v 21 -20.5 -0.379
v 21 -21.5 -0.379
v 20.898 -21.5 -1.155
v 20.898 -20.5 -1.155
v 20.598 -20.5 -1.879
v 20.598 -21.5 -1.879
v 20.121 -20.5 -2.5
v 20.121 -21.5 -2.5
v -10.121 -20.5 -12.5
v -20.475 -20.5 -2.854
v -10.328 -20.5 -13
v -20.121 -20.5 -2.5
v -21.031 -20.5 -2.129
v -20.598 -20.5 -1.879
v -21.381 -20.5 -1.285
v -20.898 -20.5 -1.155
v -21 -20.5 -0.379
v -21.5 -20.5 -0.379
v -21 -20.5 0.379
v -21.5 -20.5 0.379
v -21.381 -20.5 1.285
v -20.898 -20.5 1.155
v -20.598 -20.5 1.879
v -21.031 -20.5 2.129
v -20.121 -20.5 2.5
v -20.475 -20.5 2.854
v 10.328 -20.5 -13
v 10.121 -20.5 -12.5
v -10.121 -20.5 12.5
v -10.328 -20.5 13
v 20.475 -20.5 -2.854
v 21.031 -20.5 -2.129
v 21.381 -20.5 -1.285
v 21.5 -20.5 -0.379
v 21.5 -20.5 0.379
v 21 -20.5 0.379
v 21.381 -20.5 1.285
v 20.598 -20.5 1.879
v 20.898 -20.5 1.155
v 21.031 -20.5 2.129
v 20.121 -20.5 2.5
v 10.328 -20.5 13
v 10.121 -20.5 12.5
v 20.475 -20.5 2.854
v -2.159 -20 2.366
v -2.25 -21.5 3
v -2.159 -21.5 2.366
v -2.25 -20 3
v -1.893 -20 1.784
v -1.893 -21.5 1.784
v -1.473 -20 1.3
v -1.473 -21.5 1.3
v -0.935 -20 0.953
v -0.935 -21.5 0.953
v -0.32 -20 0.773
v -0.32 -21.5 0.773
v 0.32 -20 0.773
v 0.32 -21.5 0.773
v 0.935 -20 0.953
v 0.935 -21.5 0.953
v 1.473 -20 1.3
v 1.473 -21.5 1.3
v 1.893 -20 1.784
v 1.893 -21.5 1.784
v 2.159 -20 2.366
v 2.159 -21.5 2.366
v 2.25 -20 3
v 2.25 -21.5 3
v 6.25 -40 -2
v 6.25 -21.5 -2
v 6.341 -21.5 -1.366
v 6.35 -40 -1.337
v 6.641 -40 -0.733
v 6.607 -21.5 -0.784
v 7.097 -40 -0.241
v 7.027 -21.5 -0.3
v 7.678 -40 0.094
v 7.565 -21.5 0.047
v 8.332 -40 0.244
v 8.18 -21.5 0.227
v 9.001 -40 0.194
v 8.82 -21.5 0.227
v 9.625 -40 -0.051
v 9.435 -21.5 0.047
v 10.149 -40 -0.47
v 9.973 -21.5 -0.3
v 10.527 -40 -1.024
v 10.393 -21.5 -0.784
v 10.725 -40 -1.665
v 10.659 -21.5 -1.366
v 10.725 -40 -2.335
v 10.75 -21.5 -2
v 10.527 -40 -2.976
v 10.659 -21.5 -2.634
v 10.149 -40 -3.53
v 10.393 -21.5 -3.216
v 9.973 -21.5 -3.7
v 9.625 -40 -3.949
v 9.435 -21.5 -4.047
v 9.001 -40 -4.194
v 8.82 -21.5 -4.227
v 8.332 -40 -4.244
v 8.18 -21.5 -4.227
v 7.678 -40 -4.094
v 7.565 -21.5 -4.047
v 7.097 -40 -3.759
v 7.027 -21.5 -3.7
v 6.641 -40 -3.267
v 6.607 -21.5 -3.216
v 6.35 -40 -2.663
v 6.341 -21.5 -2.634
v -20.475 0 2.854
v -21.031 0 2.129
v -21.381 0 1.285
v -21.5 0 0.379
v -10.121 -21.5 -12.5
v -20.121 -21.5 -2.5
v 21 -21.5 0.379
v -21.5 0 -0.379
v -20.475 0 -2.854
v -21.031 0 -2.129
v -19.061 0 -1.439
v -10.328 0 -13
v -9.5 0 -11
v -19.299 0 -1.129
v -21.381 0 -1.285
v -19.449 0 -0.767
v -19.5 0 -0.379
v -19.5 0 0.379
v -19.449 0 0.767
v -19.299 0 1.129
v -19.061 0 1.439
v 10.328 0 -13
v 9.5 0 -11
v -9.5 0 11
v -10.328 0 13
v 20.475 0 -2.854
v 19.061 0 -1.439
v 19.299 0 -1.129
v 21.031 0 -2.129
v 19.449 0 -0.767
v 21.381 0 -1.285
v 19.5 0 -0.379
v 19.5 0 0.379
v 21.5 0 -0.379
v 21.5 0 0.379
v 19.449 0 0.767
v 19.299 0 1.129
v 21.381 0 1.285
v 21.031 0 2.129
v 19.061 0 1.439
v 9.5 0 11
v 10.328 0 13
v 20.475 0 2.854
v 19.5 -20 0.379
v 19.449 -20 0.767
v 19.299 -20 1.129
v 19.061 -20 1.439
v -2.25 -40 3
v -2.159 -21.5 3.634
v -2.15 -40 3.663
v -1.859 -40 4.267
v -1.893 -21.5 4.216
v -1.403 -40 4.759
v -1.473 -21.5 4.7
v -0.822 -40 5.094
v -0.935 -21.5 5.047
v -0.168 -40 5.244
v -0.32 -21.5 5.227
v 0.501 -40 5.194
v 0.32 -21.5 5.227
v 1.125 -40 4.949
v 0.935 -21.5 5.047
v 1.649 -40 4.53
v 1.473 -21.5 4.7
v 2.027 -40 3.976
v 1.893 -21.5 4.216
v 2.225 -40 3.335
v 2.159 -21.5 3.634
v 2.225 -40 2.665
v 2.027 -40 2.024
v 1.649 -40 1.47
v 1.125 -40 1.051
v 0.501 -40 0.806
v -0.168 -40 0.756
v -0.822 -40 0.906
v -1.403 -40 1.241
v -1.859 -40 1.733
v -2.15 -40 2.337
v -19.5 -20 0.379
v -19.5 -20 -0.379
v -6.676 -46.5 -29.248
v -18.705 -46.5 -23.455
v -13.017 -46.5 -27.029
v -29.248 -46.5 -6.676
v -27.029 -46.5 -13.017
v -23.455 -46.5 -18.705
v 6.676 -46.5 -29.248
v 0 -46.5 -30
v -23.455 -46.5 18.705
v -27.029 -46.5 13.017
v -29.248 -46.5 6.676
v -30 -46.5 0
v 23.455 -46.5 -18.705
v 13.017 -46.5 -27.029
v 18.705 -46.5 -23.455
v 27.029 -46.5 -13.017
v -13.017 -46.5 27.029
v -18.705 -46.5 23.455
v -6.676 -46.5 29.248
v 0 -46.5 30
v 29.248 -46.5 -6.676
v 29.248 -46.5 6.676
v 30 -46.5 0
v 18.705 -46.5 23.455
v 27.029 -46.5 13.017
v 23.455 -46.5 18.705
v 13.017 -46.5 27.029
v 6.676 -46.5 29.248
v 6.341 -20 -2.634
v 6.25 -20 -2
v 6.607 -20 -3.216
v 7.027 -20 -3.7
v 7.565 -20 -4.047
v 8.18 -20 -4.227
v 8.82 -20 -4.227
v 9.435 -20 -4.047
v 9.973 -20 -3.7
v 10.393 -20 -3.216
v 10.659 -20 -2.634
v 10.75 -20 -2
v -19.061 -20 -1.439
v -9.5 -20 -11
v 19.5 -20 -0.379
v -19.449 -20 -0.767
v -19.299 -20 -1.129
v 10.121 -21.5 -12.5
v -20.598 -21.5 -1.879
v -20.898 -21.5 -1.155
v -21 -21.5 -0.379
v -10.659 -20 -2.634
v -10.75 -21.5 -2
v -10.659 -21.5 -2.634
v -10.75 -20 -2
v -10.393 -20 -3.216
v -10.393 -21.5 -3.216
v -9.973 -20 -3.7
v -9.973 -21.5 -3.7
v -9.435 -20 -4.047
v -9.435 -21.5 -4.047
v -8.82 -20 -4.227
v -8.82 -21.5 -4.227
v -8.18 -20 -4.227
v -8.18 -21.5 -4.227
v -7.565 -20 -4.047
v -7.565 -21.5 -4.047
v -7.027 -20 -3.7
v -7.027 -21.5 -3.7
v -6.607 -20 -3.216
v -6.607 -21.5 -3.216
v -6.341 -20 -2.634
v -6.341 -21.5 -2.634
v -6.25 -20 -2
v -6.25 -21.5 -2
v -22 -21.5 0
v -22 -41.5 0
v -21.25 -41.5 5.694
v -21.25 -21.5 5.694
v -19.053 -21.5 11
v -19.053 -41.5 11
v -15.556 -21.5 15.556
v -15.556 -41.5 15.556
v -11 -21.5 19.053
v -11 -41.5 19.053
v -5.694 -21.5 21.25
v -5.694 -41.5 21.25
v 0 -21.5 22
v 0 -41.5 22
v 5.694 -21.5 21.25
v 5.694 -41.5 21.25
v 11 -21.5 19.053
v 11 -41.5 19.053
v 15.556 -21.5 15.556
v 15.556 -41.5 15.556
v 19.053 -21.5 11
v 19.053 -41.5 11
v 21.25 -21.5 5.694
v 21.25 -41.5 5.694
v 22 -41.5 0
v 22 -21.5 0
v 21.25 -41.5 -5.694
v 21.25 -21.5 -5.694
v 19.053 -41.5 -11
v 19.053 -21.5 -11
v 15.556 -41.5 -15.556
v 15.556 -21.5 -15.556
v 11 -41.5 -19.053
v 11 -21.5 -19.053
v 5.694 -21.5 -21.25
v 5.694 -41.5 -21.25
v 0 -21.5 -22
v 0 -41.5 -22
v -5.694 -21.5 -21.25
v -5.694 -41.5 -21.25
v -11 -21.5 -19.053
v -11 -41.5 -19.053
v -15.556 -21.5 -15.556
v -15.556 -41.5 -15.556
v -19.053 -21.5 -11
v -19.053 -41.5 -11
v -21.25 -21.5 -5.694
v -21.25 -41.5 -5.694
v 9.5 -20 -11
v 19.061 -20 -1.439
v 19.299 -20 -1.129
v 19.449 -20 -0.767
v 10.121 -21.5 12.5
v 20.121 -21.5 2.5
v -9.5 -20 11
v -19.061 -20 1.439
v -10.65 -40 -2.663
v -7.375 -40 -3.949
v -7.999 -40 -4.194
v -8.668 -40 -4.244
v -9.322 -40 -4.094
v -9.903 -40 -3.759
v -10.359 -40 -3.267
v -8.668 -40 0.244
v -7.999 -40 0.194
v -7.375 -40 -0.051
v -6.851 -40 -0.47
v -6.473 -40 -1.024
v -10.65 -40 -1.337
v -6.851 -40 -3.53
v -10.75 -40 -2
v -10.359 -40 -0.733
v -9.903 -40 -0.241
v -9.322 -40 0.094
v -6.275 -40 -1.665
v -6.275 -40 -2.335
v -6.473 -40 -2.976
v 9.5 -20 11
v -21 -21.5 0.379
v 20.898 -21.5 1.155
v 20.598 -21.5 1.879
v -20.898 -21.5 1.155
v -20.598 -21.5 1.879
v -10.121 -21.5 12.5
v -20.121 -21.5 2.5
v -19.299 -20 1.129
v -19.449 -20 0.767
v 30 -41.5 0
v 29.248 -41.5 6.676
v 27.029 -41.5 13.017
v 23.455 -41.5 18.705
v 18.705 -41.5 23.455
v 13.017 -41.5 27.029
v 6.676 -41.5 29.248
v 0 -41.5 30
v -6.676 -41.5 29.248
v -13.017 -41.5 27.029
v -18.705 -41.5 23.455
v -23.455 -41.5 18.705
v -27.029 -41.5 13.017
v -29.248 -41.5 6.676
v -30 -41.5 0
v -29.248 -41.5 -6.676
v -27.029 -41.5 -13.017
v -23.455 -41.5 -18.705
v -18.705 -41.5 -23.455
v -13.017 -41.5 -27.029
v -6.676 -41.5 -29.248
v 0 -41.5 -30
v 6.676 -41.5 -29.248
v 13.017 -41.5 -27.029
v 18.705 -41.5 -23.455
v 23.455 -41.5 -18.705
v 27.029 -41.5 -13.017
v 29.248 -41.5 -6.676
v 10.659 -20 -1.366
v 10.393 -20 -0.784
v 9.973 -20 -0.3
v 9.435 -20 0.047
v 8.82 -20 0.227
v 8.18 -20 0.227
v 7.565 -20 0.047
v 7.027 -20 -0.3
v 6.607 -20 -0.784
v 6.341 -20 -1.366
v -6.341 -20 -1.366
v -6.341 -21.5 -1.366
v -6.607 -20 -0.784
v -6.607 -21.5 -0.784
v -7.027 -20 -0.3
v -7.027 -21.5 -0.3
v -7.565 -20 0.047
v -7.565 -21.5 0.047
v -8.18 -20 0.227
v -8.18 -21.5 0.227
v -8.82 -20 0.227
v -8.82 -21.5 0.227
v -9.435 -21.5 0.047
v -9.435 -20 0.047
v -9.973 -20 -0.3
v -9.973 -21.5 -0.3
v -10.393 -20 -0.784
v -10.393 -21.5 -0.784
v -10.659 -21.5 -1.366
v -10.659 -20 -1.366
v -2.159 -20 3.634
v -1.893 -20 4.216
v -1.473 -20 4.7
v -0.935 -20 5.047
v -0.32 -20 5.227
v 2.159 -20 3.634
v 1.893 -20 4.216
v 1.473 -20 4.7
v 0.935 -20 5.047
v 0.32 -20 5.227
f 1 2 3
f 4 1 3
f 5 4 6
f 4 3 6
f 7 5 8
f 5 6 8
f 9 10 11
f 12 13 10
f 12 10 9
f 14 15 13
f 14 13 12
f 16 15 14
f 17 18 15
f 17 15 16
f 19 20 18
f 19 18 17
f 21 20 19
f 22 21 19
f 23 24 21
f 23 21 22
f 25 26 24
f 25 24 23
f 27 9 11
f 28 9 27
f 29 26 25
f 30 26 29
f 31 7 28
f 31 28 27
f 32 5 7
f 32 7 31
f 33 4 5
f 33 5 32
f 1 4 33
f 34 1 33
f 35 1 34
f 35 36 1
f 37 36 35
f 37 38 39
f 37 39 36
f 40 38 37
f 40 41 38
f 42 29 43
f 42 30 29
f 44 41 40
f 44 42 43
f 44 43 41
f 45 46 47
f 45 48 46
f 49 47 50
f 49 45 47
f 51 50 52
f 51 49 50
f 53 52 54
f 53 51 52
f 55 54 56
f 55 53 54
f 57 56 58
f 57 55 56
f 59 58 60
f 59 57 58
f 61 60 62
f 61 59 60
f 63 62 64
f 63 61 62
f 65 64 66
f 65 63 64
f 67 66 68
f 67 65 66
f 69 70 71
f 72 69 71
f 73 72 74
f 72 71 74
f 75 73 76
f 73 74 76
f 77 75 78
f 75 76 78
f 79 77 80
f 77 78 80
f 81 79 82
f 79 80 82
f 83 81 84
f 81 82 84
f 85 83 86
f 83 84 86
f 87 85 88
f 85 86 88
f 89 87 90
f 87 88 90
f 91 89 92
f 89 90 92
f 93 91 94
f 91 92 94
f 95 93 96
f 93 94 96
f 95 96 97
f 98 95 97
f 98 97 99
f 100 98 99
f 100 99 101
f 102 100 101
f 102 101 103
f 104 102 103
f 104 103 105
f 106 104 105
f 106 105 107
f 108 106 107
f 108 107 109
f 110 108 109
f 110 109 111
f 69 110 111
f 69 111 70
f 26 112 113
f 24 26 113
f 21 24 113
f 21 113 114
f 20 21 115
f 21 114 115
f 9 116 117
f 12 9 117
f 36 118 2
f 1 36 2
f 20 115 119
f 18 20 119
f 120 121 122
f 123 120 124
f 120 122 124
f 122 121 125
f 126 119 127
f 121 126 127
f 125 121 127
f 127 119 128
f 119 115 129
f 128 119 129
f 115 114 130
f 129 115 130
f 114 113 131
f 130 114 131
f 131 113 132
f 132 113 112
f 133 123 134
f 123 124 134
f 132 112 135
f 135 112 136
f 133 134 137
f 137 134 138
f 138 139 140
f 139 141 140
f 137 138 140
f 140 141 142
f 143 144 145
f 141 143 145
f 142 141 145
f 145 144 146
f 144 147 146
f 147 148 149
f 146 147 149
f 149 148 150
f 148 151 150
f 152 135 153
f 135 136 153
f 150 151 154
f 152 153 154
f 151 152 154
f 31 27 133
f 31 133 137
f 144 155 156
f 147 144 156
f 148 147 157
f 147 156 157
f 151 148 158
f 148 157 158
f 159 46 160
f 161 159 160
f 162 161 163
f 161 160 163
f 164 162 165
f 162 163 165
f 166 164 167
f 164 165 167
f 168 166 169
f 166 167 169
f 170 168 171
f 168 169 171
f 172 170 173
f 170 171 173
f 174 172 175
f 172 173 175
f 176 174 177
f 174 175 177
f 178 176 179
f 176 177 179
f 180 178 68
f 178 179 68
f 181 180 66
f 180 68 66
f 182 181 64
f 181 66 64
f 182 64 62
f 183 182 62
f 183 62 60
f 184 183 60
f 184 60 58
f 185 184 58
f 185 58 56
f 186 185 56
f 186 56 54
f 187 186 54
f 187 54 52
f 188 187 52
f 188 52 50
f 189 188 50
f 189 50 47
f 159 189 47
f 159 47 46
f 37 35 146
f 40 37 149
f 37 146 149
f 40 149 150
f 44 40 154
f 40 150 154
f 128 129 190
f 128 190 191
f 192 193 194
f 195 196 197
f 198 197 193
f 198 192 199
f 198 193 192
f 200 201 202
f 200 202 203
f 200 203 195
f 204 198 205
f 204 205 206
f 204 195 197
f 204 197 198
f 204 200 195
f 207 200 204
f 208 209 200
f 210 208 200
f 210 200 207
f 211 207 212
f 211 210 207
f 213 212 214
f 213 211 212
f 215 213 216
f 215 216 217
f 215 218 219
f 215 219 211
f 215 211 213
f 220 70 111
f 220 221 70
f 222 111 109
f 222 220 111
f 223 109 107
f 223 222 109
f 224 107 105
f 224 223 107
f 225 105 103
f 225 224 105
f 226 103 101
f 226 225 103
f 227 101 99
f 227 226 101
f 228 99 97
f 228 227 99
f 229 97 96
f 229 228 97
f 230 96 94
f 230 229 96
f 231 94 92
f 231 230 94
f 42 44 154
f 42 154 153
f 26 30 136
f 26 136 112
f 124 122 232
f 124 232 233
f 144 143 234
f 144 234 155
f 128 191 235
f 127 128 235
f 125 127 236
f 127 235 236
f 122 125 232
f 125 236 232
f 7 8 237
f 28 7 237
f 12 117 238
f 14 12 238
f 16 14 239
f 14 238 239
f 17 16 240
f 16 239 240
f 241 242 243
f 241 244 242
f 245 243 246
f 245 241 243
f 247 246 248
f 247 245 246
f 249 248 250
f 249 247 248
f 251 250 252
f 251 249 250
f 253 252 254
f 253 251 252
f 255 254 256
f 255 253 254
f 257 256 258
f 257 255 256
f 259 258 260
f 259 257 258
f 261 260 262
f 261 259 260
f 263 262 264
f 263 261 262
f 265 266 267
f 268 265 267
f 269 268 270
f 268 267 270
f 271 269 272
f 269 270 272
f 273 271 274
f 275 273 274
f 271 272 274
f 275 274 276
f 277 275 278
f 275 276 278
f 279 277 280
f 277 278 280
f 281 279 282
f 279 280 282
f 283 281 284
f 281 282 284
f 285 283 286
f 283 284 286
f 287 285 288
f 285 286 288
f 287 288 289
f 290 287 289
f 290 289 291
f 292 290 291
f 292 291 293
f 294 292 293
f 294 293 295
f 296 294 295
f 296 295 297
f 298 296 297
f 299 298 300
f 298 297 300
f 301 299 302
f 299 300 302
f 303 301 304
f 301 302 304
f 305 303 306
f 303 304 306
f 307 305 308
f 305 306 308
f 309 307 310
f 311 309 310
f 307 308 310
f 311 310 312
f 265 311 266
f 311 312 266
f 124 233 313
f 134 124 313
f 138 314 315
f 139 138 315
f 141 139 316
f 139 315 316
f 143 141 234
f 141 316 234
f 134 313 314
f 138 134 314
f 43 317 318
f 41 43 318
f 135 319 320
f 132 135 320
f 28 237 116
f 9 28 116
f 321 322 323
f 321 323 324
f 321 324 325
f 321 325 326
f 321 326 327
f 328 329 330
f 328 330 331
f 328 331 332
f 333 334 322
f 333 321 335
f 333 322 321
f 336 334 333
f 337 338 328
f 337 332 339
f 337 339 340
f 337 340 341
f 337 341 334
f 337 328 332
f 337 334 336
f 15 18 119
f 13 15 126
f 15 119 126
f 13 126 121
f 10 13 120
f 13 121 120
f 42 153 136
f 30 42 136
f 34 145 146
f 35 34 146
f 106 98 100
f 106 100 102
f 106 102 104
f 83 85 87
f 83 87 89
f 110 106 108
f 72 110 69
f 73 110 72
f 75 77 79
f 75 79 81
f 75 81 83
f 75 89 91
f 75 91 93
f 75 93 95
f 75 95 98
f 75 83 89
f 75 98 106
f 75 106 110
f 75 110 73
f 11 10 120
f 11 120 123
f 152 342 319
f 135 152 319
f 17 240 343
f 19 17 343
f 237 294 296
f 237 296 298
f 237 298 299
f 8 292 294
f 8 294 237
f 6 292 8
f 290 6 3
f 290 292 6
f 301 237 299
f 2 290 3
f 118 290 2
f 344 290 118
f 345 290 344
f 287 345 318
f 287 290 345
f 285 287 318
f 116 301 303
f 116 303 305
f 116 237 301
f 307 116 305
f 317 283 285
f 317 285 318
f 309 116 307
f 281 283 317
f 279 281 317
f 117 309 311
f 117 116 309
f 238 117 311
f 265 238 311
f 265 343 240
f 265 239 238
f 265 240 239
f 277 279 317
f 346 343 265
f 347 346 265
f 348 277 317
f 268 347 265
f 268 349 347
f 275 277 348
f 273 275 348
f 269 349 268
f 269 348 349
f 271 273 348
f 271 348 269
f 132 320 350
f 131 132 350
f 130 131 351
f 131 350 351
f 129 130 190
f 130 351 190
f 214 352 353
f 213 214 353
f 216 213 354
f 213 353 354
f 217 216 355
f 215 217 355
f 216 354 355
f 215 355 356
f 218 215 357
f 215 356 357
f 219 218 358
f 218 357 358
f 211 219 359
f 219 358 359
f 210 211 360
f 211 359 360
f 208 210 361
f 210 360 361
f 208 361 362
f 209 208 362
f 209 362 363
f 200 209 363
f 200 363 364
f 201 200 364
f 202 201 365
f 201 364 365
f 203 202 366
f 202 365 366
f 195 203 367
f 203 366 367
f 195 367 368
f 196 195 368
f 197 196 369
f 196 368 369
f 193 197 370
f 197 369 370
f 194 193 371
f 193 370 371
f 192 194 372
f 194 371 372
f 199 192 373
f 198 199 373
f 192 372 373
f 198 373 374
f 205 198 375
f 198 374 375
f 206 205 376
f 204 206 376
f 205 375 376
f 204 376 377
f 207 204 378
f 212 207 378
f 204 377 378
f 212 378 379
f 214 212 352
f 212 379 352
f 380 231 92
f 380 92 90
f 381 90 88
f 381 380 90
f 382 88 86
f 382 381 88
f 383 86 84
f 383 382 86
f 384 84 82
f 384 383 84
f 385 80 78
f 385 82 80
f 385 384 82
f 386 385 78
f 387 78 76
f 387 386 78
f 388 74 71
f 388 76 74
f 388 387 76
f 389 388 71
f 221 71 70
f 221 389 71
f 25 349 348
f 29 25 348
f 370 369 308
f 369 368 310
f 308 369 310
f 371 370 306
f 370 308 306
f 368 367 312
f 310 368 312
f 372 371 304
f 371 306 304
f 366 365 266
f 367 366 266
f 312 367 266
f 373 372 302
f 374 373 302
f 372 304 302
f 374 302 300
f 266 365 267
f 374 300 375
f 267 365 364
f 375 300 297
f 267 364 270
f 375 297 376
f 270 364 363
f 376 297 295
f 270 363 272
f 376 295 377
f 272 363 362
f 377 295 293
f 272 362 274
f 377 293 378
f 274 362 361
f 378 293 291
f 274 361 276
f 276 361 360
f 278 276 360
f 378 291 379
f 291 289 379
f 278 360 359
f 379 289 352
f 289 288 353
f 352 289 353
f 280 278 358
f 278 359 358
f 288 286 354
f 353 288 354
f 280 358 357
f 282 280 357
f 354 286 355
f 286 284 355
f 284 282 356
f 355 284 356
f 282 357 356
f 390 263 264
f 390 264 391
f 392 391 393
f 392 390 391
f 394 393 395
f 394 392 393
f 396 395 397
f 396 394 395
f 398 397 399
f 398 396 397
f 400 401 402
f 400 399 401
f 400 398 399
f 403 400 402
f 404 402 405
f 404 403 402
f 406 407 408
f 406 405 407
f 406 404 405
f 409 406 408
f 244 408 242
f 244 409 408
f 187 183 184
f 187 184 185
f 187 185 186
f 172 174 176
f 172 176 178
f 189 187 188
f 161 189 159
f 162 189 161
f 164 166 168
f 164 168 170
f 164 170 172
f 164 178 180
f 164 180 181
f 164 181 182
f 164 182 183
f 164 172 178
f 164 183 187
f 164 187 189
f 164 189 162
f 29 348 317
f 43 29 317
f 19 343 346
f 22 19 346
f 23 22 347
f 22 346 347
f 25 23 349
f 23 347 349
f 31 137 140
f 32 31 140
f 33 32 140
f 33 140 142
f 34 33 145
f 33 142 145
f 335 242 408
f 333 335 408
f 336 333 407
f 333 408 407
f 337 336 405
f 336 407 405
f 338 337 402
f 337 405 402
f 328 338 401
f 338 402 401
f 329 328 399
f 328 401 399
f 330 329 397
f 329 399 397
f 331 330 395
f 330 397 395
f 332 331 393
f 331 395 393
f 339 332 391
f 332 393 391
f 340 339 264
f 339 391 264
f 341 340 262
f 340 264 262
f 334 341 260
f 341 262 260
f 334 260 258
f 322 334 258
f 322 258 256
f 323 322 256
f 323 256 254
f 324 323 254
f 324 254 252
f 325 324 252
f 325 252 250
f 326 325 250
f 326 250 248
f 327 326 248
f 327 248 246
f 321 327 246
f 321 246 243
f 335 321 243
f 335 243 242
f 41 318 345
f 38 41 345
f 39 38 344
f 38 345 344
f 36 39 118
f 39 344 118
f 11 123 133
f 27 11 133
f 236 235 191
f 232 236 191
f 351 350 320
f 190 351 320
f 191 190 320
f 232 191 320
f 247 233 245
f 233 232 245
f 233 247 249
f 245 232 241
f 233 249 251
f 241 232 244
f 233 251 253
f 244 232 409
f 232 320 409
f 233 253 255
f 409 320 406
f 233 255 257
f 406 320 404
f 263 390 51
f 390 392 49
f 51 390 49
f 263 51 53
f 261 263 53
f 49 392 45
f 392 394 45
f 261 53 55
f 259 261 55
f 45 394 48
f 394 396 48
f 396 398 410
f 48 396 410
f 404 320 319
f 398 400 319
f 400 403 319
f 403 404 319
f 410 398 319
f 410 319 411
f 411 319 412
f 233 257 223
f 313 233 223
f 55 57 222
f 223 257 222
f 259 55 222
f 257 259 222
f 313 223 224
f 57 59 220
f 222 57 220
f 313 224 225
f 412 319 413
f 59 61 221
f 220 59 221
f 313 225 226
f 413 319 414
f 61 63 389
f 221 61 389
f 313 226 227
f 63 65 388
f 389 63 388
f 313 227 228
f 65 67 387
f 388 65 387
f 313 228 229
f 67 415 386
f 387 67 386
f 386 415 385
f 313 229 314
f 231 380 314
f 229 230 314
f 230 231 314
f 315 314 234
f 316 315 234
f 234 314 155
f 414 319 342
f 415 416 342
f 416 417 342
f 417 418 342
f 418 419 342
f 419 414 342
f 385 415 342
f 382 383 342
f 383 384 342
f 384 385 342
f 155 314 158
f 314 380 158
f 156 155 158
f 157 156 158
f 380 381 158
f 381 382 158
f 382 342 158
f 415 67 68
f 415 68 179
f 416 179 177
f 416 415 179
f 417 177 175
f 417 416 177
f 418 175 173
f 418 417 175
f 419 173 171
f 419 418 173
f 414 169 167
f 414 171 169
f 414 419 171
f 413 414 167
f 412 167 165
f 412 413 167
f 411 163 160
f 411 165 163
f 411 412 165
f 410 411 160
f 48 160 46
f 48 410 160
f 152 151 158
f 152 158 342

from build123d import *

# Parameters (mm, degrees)
F0_W      = 39
F0_H      = 22
F1_DEPTH  = 20
F2_SIZE   = 10
F3_R      = 1.5
F5_DEPTH  = 20
F6_T      = -2
F7_R      = 2.25
F8_DEPTH  = 1.5
F10_R     = 2.25
F11_DEPTH = 20
F13_DEPTH = 1
F14_R     = 30
F15_DEPTH = 5
F16_R     = 22
F17_DEPTH = 20
F18_R     = 2.25
F19_DEPTH = 20


with BuildPart() as f1:
    # F0 (on Front) → F1 (new body)
    with BuildSketch(Plane.XZ):
        Rectangle(F0_W, F0_H)
    extrude(amount=F1_DEPTH)

    # F2
    f2_edges = [f1.edges().sort_by_distance(p)[0] for p in [
        (19.5, -10, 11),
        (-19.5, -10, 11),
        (19.5, -10, -11),
        (-19.5, -10, -11),
    ]]
    chamfer(f2_edges, length=F2_SIZE)

    # F3
    f3_edges = [f1.edges().sort_by_distance(p)[0] for p in [
        (19.5, -10, -1),
        (-19.5, -10, 1),
        (-19.5, -10, -1),
        (19.5, -10, 1),
    ]]
    fillet(f3_edges, radius=F3_R)

    # F4 (on face) → F5 (join, through all)
    with BuildSketch(Plane.XZ.offset(20)):
        with BuildLine():
            ThreePointArc((-20.4748737342, 2.8535533906), (-21.2335783638, 1.7180716697), (-21.5, 0.3786796564))
            Line((-21.5, 0.3786796564), (-21.5, -0.3786796564))
            ThreePointArc((-21.5, -0.3786796564), (-21.2335783638, -1.7180716697), (-20.4748737342, -2.8535533906))
            Line((-20.4748737342, -2.8535533906), (-10.3284271247, -13))
            Line((-10.3284271247, -13), (10.3284271247, -13))
            Line((10.3284271247, -13), (20.4748737342, -2.8535533906))
            ThreePointArc((20.4748737342, -2.8535533906), (21.2335783638, -1.7180716697), (21.5, -0.3786796564))
            Line((21.5, -0.3786796564), (21.5, 0.3786796564))
            ThreePointArc((21.5, 0.3786796564), (21.2335783638, 1.7180716697), (20.4748737342, 2.8535533906))
            Line((20.4748737342, 2.8535533906), (10.3284271247, 13))
            Line((10.3284271247, 13), (-10.3284271247, 13))
            Line((-10.3284271247, 13), (-20.4748737342, 2.8535533906))
        make_face()
    extrude(amount=-F5_DEPTH)

    # F6
    f6_openings = [f1.faces().sort_by_distance(p)[0] for p in [
        (0, -20, 0),
        (0, 0, 0),
    ]]
    offset(amount=F6_T, openings=f6_openings)

    # F7 (on face) → F8 (join)
    with BuildSketch(Plane.XZ.offset(20)):
        with BuildLine():
            Line((10.3284271247, 13), (-10.3284271247, 13))
            Line((-10.3284271247, 13), (-20.4748737342, 2.8535533906))
            ThreePointArc((-20.4748737342, 2.8535533906), (-21.2335783638, 1.7180716697), (-21.5, 0.3786796564))
            Line((-21.5, 0.3786796564), (-21.5, -0.3786796564))
            ThreePointArc((-21.5, -0.3786796564), (-21.2335783638, -1.7180716697), (-20.4748737342, -2.8535533906))
            Line((-20.4748737342, -2.8535533906), (-10.3284271247, -13))
            Line((-10.3284271247, -13), (10.3284271247, -13))
            Line((10.3284271247, -13), (20.4748737342, -2.8535533906))
            ThreePointArc((20.4748737342, -2.8535533906), (21.2335783638, -1.7180716697), (21.5, -0.3786796564))
            Line((21.5, -0.3786796564), (21.5, 0.3786796564))
            ThreePointArc((21.5, 0.3786796564), (21.2335783638, 1.7180716697), (20.4748737342, 2.8535533906))
            Line((20.4748737342, 2.8535533906), (10.3284271247, 13))
        make_face()
        with Locations((-8.5, -2)):
            Circle(F7_R, mode=Mode.SUBTRACT)
        with Locations((8.5, -2)):
            Circle(F7_R, mode=Mode.SUBTRACT)
        with Locations((0, 3)):
            Circle(F7_R, mode=Mode.SUBTRACT)
    extrude(amount=F8_DEPTH)

    # F10 (on face) → F11 (join)
    with BuildSketch(Plane.XZ.offset(21.5)):
        with BuildLine():
            ThreePointArc((-21.5, -0.3786796564), (-21.2335783638, -1.7180716697), (-20.4748737342, -2.8535533906))
            Line((-20.4748737342, -2.8535533906), (-10.3284271247, -13))
            Line((-10.3284271247, -13), (10.3284271247, -13))
            Line((10.3284271247, -13), (20.4748737342, -2.8535533906))
            ThreePointArc((20.4748737342, -2.8535533906), (21.2335783638, -1.7180716697), (21.5, -0.3786796564))
            Line((21.5, -0.3786796564), (21.5, 0.3786796564))
            ThreePointArc((21.5, 0.3786796564), (21.2335783638, 1.7180716697), (20.4748737342, 2.8535533906))
            Line((20.4748737342, 2.8535533906), (10.3284271247, 13))
            Line((10.3284271247, 13), (-10.3284271247, 13))
            Line((-10.3284271247, 13), (-20.4748737342, 2.8535533906))
            ThreePointArc((-20.4748737342, 2.8535533906), (-21.2335783638, 1.7180716697), (-21.5, 0.3786796564))
            Line((-21.5, 0.3786796564), (-21.5, -0.3786796564))
        make_face()
        with Locations((-8.5, -2)):
            Circle(F10_R, mode=Mode.SUBTRACT)
        with Locations((8.5, -2)):
            Circle(F10_R, mode=Mode.SUBTRACT)
        with Locations((0, 3)):
            Circle(F10_R, mode=Mode.SUBTRACT)
    extrude(amount=F11_DEPTH)

    # F12 (on offset) → F13 (cut)
    with BuildSketch(Plane.XZ.offset(21.5)):
        with BuildLine():
            Line((20.4748737342, 2.8535533906), (10.3284271247, 13))
            Line((10.3284271247, 13), (-10.3284271247, 13))
            Line((-10.3284271247, 13), (-20.4748737342, 2.8535533906))
            ThreePointArc((-20.4748737342, 2.8535533906), (-21.2335783638, 1.7180716697), (-21.5, 0.3786796564))
            Line((-21.5, 0.3786796564), (-21.5, -0.3786796564))
            ThreePointArc((-21.5, -0.3786796564), (-21.2335783638, -1.7180716697), (-20.4748737342, -2.8535533906))
            Line((-20.4748737342, -2.8535533906), (-10.3284271247, -13))
            Line((-10.3284271247, -13), (10.3284271247, -13))
            Line((10.3284271247, -13), (20.4748737342, -2.8535533906))
            ThreePointArc((20.4748737342, -2.8535533906), (21.2335783638, -1.7180716697), (21.5, -0.3786796564))
            Line((21.5, -0.3786796564), (21.5, 0.3786796564))
            ThreePointArc((21.5, 0.3786796564), (21.2335783638, 1.7180716697), (20.4748737342, 2.8535533906))
        make_face()
        with BuildLine():
            Line((-10.1213203436, 12.5), (10.1213203436, 12.5))
            Line((10.1213203436, 12.5), (20.1213203436, 2.5))
            ThreePointArc((20.1213203436, 2.5), (20.7716385975, 1.5267299535), (21, 0.3786796564))
            Line((21, 0.3786796564), (21, -0.3786796564))
            ThreePointArc((21, -0.3786796564), (20.7716385975, -1.5267299535), (20.1213203436, -2.5))
            Line((20.1213203436, -2.5), (10.1213203436, -12.5))
            Line((10.1213203436, -12.5), (-10.1213203436, -12.5))
            Line((-10.1213203436, -12.5), (-20.1213203436, -2.5))
            ThreePointArc((-20.1213203436, -2.5), (-20.7716385975, -1.5267299535), (-21, -0.3786796564))
            Line((-21, -0.3786796564), (-21, 0.3786796564))
            ThreePointArc((-21, 0.3786796564), (-20.7716385975, 1.5267299535), (-20.1213203436, 2.5))
            Line((-20.1213203436, 2.5), (-10.1213203436, 12.5))
        make_face(mode=Mode.SUBTRACT)
    extrude(amount=-F13_DEPTH, mode=Mode.SUBTRACT)

    # F14 (on face) → F15 (join)
    with BuildSketch(Plane.XZ.offset(41.5)):
        Circle(F14_R)
    extrude(amount=F15_DEPTH)

    # F16 (on face) → F17 (join, through all)
    with BuildSketch(Plane(origin=(0, -41.5, 0), x_dir=(-1, 0, 0), z_dir=(0, 1, 0))):
        Circle(F16_R)
    extrude(amount=F17_DEPTH)

    # F18 (on face) → F19 (cut)
    with BuildSketch(Plane(origin=(0, -20, 0), x_dir=(-1, 0, 0), z_dir=(0, 1, 0))):
        with Locations((8.5, -2)):
            Circle(F18_R)
        with Locations((0, 3)):
            Circle(F18_R)
        with Locations((-8.5, -2)):
            Circle(F18_R)
    extrude(amount=-F19_DEPTH, mode=Mode.SUBTRACT)


solid = f1.part
